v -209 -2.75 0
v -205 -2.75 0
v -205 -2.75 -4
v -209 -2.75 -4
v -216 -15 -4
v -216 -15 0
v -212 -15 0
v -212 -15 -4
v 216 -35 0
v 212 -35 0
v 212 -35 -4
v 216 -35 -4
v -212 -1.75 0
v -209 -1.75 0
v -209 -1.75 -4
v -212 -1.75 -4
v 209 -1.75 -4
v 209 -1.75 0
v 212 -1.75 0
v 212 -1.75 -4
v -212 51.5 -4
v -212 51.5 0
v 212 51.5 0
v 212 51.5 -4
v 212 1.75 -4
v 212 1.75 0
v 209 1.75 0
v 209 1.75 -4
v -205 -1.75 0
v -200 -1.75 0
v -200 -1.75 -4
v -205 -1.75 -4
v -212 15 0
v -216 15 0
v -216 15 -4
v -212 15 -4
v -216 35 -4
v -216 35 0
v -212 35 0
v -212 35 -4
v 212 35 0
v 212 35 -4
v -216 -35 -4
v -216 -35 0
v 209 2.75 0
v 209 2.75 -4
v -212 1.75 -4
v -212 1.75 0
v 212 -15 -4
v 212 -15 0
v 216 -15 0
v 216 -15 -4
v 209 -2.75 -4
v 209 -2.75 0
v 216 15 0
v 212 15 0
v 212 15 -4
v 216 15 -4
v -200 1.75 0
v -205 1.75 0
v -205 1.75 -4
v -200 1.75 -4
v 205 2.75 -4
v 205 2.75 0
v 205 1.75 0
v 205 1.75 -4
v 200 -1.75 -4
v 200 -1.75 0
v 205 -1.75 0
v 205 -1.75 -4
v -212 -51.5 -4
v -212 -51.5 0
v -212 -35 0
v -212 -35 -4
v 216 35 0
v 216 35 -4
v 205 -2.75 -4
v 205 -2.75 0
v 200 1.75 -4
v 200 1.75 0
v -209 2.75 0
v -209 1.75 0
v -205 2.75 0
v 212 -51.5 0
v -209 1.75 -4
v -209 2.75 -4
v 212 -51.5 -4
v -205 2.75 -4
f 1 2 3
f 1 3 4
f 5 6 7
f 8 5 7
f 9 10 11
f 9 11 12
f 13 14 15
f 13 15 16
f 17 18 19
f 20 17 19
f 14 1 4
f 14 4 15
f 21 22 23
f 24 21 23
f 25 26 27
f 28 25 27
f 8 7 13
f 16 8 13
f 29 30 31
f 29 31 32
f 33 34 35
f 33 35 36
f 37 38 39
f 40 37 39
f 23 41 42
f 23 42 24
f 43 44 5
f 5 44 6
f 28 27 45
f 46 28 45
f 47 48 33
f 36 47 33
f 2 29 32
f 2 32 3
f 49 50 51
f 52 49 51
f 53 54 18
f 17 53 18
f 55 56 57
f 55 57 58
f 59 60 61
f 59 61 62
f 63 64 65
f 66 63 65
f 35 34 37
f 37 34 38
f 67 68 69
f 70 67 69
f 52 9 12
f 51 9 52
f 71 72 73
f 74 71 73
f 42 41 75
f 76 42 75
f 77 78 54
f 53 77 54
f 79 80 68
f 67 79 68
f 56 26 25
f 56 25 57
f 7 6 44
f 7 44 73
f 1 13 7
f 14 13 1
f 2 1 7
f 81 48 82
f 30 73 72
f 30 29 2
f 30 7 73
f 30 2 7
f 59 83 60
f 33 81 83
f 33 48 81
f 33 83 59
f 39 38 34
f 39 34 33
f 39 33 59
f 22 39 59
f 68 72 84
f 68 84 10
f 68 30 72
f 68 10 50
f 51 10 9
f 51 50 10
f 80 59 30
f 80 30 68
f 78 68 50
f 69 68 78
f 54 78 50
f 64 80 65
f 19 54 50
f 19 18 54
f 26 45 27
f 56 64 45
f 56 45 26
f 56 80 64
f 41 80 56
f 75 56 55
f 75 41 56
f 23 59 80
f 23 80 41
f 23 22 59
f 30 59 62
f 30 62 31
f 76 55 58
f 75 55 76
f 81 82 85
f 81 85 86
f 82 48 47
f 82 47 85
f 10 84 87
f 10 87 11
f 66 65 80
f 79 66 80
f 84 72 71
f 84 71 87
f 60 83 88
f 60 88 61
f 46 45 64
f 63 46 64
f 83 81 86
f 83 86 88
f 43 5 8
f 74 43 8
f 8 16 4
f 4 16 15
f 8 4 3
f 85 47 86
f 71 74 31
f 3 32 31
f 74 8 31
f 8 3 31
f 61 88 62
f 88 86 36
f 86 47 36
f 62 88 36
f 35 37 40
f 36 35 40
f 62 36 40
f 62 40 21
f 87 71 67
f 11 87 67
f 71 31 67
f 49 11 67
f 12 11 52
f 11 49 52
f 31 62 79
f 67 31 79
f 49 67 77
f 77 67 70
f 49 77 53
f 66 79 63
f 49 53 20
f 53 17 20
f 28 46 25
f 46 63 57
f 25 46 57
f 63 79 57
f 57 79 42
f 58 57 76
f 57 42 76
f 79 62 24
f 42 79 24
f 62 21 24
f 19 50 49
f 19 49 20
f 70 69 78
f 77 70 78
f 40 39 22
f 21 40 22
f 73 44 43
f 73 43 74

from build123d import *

# Parameters (mm, degrees)
SKETCH1_W          = 424
SKETCH1_H          = 103
BASE_FLANGE1_DEPTH = 4
SKETCH4_W          = 4
SKETCH4_H          = 20
TAB1_DEPTH         = 4
CUT_EXTRUDE1_DEPTH = 223.090634652


# Sheet-metal steps are written as plain solids
with BuildPart() as part:
    # Sketch1 → Base-Flange1 (new body)
    with BuildSketch(Plane.XY):
        Rectangle(SKETCH1_W, SKETCH1_H)
    extrude(amount=-BASE_FLANGE1_DEPTH)

    # Sketch4 → Tab1 (add)
    with BuildSketch(Plane.XY):
        with Locations((-214, 25)):
            Rectangle(SKETCH4_W, SKETCH4_H)
        with Locations((-214, -25)):
            Rectangle(SKETCH4_W, SKETCH4_H)
        with Locations((214, 25)):
            Rectangle(SKETCH4_W, SKETCH4_H)
        with Locations((214, -25)):
            Rectangle(SKETCH4_W, SKETCH4_H)
    extrude(amount=-TAB1_DEPTH)

    # Sketch5 → Cut-Extrude1 (cut, through all)
    with BuildSketch(Plane.XY):
        Polygon((-212, 1.75), (-209, 1.75), (-209, 2.75), (-205, 2.75), (-205, 1.75), (-200, 1.75), (-200, -1.75), (-205, -1.75), (-205, -2.75), (-209, -2.75), (-209, -1.75), (-212, -1.75), align=None)
        Polygon((212, -1.75), (212, 1.75), (209, 1.75), (209, 2.75), (205, 2.75), (205, 1.75), (200, 1.75), (200, -1.75), (205, -1.75), (205, -2.75), (209, -2.75), (209, -1.75), align=None)
    extrude(amount=-CUT_EXTRUDE1_DEPTH, mode=Mode.SUBTRACT)


solid = part.part
